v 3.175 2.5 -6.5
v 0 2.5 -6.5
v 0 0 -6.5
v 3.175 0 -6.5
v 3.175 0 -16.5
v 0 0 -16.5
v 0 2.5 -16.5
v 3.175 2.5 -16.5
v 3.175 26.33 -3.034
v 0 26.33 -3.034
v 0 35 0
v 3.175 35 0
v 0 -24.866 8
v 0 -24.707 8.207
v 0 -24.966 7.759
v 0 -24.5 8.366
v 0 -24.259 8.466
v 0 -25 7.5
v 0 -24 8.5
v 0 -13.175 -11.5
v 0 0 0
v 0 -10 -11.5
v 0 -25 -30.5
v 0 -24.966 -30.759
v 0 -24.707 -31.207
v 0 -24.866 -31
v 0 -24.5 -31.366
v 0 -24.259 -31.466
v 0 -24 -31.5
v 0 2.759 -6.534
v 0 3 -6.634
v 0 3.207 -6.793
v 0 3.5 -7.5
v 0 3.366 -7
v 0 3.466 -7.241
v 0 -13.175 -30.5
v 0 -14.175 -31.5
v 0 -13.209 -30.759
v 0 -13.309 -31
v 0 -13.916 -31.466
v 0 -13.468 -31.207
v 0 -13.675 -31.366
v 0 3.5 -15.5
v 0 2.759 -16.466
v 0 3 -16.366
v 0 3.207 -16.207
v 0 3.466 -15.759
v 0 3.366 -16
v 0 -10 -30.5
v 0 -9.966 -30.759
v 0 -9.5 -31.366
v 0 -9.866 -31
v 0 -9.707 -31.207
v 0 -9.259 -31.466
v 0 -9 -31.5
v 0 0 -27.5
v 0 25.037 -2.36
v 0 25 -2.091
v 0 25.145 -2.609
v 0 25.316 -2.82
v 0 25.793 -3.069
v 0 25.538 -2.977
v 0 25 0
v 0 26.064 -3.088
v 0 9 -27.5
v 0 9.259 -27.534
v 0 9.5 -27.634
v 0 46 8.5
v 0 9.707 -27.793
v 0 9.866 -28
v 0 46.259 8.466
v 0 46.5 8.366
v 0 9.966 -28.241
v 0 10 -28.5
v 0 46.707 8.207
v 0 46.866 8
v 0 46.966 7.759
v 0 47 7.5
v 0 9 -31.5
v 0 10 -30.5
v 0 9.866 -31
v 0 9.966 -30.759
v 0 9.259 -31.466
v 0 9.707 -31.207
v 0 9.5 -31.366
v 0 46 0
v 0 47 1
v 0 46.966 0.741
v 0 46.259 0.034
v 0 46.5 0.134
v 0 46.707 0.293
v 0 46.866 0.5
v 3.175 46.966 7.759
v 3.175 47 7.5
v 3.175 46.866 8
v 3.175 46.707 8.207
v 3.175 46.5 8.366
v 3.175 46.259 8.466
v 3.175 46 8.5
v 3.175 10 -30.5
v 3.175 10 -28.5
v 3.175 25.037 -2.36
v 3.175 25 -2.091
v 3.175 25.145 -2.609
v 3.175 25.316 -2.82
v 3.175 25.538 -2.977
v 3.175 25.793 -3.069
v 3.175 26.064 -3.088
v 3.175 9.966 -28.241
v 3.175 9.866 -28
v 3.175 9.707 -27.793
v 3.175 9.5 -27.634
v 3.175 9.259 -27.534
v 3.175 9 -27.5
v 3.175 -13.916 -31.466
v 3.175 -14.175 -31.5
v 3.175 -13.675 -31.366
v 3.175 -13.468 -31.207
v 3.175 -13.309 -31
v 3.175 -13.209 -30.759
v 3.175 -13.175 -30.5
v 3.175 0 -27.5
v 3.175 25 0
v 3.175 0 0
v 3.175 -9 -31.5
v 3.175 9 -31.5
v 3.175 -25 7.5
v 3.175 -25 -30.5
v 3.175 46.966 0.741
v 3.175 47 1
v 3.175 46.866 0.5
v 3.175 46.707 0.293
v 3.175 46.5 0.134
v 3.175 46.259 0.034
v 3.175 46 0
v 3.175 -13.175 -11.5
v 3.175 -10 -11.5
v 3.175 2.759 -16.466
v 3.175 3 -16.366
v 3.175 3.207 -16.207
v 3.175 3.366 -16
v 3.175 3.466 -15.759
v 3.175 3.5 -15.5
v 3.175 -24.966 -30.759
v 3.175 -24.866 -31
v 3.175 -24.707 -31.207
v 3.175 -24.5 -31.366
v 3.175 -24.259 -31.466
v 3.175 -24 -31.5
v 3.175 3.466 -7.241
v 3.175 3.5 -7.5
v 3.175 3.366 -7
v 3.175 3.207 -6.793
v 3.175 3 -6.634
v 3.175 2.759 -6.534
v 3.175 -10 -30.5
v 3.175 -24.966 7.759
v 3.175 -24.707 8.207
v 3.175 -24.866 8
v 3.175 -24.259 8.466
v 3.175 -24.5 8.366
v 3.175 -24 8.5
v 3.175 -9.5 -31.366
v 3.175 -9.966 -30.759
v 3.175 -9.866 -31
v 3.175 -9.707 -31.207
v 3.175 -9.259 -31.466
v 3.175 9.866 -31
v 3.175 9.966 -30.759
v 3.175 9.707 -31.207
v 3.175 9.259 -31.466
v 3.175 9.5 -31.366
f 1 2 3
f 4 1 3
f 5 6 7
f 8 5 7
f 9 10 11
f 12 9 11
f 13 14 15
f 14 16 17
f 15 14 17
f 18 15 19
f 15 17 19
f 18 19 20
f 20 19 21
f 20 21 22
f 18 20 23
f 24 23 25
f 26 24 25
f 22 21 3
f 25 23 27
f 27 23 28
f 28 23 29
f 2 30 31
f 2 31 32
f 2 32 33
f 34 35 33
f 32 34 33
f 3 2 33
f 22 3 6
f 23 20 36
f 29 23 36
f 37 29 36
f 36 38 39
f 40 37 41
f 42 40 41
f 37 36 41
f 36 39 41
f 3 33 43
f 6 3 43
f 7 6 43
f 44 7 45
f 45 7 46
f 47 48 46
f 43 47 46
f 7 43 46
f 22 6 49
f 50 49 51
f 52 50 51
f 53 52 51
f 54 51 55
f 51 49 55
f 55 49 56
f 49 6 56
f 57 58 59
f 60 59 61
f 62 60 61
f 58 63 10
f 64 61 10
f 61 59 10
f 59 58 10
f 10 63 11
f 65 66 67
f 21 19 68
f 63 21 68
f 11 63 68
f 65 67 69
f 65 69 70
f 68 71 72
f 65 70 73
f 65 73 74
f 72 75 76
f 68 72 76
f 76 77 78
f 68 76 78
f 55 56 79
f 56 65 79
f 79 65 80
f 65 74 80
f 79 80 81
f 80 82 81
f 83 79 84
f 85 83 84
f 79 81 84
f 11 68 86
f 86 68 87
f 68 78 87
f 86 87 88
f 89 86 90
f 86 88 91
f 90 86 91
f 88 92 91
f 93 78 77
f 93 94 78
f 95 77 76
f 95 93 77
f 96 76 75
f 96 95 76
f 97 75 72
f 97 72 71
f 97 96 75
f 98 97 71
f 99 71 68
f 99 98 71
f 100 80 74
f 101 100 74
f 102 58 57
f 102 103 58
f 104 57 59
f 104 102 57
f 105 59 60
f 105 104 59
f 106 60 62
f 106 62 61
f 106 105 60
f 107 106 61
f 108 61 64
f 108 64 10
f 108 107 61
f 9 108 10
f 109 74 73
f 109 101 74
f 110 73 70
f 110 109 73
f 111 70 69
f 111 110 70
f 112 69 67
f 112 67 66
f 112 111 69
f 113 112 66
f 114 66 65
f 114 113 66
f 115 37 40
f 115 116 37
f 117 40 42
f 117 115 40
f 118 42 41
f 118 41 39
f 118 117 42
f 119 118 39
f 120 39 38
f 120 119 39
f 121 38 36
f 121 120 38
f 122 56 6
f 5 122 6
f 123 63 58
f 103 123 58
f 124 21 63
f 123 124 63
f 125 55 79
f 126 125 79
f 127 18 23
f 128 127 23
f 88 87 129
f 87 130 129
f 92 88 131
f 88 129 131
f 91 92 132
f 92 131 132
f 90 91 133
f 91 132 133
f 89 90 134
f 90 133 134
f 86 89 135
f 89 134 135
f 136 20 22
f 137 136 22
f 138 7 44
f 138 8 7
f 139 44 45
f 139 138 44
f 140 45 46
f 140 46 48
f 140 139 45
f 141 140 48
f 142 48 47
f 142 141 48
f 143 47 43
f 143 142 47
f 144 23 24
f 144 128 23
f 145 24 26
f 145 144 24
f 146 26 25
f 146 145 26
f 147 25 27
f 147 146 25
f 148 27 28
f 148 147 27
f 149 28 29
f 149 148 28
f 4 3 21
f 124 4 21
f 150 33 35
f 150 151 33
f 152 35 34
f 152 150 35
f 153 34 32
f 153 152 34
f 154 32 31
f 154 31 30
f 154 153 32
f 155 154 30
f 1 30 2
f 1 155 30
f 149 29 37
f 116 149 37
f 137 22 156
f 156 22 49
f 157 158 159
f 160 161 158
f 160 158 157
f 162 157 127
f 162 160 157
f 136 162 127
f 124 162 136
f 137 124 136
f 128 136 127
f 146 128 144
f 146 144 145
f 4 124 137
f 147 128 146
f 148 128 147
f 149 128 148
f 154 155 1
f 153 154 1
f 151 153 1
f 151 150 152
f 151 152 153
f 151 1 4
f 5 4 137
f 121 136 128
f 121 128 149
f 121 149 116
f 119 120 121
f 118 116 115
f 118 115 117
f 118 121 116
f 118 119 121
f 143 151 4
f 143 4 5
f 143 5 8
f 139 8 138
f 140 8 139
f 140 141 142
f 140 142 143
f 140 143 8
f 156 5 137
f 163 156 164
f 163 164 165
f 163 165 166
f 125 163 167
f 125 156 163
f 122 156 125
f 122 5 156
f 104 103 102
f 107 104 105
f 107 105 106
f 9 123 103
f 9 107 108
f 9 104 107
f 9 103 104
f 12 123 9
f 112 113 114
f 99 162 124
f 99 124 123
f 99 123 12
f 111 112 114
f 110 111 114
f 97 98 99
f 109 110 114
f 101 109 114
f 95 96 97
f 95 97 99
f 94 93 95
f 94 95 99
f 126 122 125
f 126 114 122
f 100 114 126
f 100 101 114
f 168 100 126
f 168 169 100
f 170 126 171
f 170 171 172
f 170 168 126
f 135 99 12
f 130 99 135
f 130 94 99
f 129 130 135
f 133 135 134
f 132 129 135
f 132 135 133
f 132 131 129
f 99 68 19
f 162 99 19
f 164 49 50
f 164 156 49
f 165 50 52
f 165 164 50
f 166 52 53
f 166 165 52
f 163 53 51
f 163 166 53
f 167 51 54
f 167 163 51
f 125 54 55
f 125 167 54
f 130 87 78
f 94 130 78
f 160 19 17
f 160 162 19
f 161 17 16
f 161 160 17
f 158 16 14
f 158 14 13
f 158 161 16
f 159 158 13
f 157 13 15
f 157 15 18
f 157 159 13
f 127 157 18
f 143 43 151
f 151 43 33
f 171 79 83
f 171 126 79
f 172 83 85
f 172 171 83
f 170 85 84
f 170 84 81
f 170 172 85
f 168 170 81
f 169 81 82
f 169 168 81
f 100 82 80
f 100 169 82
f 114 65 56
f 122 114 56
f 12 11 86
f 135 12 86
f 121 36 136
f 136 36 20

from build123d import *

# Parameters (mm, degrees)
BOSS_EXTRUDE1_DEPTH = 3.175
FILLET1_R           = 1


with BuildPart() as part:
    # Sketch1 → Boss-Extrude1 (new body)
    with BuildSketch(Plane(origin=(0, 0, 0), x_dir=(0, 0, -1), z_dir=(1, 0, 0))):
        Polygon((0, 47), (-8.5, 47), (-8.5, -10), (31.5, -10), (31.5, 10), (27.5, 10), (27.5, 0), (16.5, 0), (16.5, 3.5), (6.5, 3.5), (6.5, 0), (0, 0), (0, 25), (3.5, 25), (0, 35), align=None)
        Polygon((11.5, -10), (-8.5, -10), (-8.5, -25), (31.5, -25), (31.5, -13.175), (11.5, -13.175), align=None)
    extrude(amount=BOSS_EXTRUDE1_DEPTH)

    # Fillet1
    fillet1_edges = [part.edges().sort_by_distance(p)[0] for p in [
        (1.5875, 47, 0),
        (1.5875, 25, -3.5),
        (1.5875, 3.5, -6.5),
        (1.5875, 3.5, -16.5),
        (1.5875, 10, -27.5),
        (1.5875, 10, -31.5),
        (1.5875, -10, -31.5),
        (1.5875, -13.175, -31.5),
        (1.5875, -25, -31.5),
        (1.5875, -25, 8.5),
        (1.5875, 47, 8.5),
    ]]
    fillet(fillet1_edges, radius=FILLET1_R)


solid = part.part
